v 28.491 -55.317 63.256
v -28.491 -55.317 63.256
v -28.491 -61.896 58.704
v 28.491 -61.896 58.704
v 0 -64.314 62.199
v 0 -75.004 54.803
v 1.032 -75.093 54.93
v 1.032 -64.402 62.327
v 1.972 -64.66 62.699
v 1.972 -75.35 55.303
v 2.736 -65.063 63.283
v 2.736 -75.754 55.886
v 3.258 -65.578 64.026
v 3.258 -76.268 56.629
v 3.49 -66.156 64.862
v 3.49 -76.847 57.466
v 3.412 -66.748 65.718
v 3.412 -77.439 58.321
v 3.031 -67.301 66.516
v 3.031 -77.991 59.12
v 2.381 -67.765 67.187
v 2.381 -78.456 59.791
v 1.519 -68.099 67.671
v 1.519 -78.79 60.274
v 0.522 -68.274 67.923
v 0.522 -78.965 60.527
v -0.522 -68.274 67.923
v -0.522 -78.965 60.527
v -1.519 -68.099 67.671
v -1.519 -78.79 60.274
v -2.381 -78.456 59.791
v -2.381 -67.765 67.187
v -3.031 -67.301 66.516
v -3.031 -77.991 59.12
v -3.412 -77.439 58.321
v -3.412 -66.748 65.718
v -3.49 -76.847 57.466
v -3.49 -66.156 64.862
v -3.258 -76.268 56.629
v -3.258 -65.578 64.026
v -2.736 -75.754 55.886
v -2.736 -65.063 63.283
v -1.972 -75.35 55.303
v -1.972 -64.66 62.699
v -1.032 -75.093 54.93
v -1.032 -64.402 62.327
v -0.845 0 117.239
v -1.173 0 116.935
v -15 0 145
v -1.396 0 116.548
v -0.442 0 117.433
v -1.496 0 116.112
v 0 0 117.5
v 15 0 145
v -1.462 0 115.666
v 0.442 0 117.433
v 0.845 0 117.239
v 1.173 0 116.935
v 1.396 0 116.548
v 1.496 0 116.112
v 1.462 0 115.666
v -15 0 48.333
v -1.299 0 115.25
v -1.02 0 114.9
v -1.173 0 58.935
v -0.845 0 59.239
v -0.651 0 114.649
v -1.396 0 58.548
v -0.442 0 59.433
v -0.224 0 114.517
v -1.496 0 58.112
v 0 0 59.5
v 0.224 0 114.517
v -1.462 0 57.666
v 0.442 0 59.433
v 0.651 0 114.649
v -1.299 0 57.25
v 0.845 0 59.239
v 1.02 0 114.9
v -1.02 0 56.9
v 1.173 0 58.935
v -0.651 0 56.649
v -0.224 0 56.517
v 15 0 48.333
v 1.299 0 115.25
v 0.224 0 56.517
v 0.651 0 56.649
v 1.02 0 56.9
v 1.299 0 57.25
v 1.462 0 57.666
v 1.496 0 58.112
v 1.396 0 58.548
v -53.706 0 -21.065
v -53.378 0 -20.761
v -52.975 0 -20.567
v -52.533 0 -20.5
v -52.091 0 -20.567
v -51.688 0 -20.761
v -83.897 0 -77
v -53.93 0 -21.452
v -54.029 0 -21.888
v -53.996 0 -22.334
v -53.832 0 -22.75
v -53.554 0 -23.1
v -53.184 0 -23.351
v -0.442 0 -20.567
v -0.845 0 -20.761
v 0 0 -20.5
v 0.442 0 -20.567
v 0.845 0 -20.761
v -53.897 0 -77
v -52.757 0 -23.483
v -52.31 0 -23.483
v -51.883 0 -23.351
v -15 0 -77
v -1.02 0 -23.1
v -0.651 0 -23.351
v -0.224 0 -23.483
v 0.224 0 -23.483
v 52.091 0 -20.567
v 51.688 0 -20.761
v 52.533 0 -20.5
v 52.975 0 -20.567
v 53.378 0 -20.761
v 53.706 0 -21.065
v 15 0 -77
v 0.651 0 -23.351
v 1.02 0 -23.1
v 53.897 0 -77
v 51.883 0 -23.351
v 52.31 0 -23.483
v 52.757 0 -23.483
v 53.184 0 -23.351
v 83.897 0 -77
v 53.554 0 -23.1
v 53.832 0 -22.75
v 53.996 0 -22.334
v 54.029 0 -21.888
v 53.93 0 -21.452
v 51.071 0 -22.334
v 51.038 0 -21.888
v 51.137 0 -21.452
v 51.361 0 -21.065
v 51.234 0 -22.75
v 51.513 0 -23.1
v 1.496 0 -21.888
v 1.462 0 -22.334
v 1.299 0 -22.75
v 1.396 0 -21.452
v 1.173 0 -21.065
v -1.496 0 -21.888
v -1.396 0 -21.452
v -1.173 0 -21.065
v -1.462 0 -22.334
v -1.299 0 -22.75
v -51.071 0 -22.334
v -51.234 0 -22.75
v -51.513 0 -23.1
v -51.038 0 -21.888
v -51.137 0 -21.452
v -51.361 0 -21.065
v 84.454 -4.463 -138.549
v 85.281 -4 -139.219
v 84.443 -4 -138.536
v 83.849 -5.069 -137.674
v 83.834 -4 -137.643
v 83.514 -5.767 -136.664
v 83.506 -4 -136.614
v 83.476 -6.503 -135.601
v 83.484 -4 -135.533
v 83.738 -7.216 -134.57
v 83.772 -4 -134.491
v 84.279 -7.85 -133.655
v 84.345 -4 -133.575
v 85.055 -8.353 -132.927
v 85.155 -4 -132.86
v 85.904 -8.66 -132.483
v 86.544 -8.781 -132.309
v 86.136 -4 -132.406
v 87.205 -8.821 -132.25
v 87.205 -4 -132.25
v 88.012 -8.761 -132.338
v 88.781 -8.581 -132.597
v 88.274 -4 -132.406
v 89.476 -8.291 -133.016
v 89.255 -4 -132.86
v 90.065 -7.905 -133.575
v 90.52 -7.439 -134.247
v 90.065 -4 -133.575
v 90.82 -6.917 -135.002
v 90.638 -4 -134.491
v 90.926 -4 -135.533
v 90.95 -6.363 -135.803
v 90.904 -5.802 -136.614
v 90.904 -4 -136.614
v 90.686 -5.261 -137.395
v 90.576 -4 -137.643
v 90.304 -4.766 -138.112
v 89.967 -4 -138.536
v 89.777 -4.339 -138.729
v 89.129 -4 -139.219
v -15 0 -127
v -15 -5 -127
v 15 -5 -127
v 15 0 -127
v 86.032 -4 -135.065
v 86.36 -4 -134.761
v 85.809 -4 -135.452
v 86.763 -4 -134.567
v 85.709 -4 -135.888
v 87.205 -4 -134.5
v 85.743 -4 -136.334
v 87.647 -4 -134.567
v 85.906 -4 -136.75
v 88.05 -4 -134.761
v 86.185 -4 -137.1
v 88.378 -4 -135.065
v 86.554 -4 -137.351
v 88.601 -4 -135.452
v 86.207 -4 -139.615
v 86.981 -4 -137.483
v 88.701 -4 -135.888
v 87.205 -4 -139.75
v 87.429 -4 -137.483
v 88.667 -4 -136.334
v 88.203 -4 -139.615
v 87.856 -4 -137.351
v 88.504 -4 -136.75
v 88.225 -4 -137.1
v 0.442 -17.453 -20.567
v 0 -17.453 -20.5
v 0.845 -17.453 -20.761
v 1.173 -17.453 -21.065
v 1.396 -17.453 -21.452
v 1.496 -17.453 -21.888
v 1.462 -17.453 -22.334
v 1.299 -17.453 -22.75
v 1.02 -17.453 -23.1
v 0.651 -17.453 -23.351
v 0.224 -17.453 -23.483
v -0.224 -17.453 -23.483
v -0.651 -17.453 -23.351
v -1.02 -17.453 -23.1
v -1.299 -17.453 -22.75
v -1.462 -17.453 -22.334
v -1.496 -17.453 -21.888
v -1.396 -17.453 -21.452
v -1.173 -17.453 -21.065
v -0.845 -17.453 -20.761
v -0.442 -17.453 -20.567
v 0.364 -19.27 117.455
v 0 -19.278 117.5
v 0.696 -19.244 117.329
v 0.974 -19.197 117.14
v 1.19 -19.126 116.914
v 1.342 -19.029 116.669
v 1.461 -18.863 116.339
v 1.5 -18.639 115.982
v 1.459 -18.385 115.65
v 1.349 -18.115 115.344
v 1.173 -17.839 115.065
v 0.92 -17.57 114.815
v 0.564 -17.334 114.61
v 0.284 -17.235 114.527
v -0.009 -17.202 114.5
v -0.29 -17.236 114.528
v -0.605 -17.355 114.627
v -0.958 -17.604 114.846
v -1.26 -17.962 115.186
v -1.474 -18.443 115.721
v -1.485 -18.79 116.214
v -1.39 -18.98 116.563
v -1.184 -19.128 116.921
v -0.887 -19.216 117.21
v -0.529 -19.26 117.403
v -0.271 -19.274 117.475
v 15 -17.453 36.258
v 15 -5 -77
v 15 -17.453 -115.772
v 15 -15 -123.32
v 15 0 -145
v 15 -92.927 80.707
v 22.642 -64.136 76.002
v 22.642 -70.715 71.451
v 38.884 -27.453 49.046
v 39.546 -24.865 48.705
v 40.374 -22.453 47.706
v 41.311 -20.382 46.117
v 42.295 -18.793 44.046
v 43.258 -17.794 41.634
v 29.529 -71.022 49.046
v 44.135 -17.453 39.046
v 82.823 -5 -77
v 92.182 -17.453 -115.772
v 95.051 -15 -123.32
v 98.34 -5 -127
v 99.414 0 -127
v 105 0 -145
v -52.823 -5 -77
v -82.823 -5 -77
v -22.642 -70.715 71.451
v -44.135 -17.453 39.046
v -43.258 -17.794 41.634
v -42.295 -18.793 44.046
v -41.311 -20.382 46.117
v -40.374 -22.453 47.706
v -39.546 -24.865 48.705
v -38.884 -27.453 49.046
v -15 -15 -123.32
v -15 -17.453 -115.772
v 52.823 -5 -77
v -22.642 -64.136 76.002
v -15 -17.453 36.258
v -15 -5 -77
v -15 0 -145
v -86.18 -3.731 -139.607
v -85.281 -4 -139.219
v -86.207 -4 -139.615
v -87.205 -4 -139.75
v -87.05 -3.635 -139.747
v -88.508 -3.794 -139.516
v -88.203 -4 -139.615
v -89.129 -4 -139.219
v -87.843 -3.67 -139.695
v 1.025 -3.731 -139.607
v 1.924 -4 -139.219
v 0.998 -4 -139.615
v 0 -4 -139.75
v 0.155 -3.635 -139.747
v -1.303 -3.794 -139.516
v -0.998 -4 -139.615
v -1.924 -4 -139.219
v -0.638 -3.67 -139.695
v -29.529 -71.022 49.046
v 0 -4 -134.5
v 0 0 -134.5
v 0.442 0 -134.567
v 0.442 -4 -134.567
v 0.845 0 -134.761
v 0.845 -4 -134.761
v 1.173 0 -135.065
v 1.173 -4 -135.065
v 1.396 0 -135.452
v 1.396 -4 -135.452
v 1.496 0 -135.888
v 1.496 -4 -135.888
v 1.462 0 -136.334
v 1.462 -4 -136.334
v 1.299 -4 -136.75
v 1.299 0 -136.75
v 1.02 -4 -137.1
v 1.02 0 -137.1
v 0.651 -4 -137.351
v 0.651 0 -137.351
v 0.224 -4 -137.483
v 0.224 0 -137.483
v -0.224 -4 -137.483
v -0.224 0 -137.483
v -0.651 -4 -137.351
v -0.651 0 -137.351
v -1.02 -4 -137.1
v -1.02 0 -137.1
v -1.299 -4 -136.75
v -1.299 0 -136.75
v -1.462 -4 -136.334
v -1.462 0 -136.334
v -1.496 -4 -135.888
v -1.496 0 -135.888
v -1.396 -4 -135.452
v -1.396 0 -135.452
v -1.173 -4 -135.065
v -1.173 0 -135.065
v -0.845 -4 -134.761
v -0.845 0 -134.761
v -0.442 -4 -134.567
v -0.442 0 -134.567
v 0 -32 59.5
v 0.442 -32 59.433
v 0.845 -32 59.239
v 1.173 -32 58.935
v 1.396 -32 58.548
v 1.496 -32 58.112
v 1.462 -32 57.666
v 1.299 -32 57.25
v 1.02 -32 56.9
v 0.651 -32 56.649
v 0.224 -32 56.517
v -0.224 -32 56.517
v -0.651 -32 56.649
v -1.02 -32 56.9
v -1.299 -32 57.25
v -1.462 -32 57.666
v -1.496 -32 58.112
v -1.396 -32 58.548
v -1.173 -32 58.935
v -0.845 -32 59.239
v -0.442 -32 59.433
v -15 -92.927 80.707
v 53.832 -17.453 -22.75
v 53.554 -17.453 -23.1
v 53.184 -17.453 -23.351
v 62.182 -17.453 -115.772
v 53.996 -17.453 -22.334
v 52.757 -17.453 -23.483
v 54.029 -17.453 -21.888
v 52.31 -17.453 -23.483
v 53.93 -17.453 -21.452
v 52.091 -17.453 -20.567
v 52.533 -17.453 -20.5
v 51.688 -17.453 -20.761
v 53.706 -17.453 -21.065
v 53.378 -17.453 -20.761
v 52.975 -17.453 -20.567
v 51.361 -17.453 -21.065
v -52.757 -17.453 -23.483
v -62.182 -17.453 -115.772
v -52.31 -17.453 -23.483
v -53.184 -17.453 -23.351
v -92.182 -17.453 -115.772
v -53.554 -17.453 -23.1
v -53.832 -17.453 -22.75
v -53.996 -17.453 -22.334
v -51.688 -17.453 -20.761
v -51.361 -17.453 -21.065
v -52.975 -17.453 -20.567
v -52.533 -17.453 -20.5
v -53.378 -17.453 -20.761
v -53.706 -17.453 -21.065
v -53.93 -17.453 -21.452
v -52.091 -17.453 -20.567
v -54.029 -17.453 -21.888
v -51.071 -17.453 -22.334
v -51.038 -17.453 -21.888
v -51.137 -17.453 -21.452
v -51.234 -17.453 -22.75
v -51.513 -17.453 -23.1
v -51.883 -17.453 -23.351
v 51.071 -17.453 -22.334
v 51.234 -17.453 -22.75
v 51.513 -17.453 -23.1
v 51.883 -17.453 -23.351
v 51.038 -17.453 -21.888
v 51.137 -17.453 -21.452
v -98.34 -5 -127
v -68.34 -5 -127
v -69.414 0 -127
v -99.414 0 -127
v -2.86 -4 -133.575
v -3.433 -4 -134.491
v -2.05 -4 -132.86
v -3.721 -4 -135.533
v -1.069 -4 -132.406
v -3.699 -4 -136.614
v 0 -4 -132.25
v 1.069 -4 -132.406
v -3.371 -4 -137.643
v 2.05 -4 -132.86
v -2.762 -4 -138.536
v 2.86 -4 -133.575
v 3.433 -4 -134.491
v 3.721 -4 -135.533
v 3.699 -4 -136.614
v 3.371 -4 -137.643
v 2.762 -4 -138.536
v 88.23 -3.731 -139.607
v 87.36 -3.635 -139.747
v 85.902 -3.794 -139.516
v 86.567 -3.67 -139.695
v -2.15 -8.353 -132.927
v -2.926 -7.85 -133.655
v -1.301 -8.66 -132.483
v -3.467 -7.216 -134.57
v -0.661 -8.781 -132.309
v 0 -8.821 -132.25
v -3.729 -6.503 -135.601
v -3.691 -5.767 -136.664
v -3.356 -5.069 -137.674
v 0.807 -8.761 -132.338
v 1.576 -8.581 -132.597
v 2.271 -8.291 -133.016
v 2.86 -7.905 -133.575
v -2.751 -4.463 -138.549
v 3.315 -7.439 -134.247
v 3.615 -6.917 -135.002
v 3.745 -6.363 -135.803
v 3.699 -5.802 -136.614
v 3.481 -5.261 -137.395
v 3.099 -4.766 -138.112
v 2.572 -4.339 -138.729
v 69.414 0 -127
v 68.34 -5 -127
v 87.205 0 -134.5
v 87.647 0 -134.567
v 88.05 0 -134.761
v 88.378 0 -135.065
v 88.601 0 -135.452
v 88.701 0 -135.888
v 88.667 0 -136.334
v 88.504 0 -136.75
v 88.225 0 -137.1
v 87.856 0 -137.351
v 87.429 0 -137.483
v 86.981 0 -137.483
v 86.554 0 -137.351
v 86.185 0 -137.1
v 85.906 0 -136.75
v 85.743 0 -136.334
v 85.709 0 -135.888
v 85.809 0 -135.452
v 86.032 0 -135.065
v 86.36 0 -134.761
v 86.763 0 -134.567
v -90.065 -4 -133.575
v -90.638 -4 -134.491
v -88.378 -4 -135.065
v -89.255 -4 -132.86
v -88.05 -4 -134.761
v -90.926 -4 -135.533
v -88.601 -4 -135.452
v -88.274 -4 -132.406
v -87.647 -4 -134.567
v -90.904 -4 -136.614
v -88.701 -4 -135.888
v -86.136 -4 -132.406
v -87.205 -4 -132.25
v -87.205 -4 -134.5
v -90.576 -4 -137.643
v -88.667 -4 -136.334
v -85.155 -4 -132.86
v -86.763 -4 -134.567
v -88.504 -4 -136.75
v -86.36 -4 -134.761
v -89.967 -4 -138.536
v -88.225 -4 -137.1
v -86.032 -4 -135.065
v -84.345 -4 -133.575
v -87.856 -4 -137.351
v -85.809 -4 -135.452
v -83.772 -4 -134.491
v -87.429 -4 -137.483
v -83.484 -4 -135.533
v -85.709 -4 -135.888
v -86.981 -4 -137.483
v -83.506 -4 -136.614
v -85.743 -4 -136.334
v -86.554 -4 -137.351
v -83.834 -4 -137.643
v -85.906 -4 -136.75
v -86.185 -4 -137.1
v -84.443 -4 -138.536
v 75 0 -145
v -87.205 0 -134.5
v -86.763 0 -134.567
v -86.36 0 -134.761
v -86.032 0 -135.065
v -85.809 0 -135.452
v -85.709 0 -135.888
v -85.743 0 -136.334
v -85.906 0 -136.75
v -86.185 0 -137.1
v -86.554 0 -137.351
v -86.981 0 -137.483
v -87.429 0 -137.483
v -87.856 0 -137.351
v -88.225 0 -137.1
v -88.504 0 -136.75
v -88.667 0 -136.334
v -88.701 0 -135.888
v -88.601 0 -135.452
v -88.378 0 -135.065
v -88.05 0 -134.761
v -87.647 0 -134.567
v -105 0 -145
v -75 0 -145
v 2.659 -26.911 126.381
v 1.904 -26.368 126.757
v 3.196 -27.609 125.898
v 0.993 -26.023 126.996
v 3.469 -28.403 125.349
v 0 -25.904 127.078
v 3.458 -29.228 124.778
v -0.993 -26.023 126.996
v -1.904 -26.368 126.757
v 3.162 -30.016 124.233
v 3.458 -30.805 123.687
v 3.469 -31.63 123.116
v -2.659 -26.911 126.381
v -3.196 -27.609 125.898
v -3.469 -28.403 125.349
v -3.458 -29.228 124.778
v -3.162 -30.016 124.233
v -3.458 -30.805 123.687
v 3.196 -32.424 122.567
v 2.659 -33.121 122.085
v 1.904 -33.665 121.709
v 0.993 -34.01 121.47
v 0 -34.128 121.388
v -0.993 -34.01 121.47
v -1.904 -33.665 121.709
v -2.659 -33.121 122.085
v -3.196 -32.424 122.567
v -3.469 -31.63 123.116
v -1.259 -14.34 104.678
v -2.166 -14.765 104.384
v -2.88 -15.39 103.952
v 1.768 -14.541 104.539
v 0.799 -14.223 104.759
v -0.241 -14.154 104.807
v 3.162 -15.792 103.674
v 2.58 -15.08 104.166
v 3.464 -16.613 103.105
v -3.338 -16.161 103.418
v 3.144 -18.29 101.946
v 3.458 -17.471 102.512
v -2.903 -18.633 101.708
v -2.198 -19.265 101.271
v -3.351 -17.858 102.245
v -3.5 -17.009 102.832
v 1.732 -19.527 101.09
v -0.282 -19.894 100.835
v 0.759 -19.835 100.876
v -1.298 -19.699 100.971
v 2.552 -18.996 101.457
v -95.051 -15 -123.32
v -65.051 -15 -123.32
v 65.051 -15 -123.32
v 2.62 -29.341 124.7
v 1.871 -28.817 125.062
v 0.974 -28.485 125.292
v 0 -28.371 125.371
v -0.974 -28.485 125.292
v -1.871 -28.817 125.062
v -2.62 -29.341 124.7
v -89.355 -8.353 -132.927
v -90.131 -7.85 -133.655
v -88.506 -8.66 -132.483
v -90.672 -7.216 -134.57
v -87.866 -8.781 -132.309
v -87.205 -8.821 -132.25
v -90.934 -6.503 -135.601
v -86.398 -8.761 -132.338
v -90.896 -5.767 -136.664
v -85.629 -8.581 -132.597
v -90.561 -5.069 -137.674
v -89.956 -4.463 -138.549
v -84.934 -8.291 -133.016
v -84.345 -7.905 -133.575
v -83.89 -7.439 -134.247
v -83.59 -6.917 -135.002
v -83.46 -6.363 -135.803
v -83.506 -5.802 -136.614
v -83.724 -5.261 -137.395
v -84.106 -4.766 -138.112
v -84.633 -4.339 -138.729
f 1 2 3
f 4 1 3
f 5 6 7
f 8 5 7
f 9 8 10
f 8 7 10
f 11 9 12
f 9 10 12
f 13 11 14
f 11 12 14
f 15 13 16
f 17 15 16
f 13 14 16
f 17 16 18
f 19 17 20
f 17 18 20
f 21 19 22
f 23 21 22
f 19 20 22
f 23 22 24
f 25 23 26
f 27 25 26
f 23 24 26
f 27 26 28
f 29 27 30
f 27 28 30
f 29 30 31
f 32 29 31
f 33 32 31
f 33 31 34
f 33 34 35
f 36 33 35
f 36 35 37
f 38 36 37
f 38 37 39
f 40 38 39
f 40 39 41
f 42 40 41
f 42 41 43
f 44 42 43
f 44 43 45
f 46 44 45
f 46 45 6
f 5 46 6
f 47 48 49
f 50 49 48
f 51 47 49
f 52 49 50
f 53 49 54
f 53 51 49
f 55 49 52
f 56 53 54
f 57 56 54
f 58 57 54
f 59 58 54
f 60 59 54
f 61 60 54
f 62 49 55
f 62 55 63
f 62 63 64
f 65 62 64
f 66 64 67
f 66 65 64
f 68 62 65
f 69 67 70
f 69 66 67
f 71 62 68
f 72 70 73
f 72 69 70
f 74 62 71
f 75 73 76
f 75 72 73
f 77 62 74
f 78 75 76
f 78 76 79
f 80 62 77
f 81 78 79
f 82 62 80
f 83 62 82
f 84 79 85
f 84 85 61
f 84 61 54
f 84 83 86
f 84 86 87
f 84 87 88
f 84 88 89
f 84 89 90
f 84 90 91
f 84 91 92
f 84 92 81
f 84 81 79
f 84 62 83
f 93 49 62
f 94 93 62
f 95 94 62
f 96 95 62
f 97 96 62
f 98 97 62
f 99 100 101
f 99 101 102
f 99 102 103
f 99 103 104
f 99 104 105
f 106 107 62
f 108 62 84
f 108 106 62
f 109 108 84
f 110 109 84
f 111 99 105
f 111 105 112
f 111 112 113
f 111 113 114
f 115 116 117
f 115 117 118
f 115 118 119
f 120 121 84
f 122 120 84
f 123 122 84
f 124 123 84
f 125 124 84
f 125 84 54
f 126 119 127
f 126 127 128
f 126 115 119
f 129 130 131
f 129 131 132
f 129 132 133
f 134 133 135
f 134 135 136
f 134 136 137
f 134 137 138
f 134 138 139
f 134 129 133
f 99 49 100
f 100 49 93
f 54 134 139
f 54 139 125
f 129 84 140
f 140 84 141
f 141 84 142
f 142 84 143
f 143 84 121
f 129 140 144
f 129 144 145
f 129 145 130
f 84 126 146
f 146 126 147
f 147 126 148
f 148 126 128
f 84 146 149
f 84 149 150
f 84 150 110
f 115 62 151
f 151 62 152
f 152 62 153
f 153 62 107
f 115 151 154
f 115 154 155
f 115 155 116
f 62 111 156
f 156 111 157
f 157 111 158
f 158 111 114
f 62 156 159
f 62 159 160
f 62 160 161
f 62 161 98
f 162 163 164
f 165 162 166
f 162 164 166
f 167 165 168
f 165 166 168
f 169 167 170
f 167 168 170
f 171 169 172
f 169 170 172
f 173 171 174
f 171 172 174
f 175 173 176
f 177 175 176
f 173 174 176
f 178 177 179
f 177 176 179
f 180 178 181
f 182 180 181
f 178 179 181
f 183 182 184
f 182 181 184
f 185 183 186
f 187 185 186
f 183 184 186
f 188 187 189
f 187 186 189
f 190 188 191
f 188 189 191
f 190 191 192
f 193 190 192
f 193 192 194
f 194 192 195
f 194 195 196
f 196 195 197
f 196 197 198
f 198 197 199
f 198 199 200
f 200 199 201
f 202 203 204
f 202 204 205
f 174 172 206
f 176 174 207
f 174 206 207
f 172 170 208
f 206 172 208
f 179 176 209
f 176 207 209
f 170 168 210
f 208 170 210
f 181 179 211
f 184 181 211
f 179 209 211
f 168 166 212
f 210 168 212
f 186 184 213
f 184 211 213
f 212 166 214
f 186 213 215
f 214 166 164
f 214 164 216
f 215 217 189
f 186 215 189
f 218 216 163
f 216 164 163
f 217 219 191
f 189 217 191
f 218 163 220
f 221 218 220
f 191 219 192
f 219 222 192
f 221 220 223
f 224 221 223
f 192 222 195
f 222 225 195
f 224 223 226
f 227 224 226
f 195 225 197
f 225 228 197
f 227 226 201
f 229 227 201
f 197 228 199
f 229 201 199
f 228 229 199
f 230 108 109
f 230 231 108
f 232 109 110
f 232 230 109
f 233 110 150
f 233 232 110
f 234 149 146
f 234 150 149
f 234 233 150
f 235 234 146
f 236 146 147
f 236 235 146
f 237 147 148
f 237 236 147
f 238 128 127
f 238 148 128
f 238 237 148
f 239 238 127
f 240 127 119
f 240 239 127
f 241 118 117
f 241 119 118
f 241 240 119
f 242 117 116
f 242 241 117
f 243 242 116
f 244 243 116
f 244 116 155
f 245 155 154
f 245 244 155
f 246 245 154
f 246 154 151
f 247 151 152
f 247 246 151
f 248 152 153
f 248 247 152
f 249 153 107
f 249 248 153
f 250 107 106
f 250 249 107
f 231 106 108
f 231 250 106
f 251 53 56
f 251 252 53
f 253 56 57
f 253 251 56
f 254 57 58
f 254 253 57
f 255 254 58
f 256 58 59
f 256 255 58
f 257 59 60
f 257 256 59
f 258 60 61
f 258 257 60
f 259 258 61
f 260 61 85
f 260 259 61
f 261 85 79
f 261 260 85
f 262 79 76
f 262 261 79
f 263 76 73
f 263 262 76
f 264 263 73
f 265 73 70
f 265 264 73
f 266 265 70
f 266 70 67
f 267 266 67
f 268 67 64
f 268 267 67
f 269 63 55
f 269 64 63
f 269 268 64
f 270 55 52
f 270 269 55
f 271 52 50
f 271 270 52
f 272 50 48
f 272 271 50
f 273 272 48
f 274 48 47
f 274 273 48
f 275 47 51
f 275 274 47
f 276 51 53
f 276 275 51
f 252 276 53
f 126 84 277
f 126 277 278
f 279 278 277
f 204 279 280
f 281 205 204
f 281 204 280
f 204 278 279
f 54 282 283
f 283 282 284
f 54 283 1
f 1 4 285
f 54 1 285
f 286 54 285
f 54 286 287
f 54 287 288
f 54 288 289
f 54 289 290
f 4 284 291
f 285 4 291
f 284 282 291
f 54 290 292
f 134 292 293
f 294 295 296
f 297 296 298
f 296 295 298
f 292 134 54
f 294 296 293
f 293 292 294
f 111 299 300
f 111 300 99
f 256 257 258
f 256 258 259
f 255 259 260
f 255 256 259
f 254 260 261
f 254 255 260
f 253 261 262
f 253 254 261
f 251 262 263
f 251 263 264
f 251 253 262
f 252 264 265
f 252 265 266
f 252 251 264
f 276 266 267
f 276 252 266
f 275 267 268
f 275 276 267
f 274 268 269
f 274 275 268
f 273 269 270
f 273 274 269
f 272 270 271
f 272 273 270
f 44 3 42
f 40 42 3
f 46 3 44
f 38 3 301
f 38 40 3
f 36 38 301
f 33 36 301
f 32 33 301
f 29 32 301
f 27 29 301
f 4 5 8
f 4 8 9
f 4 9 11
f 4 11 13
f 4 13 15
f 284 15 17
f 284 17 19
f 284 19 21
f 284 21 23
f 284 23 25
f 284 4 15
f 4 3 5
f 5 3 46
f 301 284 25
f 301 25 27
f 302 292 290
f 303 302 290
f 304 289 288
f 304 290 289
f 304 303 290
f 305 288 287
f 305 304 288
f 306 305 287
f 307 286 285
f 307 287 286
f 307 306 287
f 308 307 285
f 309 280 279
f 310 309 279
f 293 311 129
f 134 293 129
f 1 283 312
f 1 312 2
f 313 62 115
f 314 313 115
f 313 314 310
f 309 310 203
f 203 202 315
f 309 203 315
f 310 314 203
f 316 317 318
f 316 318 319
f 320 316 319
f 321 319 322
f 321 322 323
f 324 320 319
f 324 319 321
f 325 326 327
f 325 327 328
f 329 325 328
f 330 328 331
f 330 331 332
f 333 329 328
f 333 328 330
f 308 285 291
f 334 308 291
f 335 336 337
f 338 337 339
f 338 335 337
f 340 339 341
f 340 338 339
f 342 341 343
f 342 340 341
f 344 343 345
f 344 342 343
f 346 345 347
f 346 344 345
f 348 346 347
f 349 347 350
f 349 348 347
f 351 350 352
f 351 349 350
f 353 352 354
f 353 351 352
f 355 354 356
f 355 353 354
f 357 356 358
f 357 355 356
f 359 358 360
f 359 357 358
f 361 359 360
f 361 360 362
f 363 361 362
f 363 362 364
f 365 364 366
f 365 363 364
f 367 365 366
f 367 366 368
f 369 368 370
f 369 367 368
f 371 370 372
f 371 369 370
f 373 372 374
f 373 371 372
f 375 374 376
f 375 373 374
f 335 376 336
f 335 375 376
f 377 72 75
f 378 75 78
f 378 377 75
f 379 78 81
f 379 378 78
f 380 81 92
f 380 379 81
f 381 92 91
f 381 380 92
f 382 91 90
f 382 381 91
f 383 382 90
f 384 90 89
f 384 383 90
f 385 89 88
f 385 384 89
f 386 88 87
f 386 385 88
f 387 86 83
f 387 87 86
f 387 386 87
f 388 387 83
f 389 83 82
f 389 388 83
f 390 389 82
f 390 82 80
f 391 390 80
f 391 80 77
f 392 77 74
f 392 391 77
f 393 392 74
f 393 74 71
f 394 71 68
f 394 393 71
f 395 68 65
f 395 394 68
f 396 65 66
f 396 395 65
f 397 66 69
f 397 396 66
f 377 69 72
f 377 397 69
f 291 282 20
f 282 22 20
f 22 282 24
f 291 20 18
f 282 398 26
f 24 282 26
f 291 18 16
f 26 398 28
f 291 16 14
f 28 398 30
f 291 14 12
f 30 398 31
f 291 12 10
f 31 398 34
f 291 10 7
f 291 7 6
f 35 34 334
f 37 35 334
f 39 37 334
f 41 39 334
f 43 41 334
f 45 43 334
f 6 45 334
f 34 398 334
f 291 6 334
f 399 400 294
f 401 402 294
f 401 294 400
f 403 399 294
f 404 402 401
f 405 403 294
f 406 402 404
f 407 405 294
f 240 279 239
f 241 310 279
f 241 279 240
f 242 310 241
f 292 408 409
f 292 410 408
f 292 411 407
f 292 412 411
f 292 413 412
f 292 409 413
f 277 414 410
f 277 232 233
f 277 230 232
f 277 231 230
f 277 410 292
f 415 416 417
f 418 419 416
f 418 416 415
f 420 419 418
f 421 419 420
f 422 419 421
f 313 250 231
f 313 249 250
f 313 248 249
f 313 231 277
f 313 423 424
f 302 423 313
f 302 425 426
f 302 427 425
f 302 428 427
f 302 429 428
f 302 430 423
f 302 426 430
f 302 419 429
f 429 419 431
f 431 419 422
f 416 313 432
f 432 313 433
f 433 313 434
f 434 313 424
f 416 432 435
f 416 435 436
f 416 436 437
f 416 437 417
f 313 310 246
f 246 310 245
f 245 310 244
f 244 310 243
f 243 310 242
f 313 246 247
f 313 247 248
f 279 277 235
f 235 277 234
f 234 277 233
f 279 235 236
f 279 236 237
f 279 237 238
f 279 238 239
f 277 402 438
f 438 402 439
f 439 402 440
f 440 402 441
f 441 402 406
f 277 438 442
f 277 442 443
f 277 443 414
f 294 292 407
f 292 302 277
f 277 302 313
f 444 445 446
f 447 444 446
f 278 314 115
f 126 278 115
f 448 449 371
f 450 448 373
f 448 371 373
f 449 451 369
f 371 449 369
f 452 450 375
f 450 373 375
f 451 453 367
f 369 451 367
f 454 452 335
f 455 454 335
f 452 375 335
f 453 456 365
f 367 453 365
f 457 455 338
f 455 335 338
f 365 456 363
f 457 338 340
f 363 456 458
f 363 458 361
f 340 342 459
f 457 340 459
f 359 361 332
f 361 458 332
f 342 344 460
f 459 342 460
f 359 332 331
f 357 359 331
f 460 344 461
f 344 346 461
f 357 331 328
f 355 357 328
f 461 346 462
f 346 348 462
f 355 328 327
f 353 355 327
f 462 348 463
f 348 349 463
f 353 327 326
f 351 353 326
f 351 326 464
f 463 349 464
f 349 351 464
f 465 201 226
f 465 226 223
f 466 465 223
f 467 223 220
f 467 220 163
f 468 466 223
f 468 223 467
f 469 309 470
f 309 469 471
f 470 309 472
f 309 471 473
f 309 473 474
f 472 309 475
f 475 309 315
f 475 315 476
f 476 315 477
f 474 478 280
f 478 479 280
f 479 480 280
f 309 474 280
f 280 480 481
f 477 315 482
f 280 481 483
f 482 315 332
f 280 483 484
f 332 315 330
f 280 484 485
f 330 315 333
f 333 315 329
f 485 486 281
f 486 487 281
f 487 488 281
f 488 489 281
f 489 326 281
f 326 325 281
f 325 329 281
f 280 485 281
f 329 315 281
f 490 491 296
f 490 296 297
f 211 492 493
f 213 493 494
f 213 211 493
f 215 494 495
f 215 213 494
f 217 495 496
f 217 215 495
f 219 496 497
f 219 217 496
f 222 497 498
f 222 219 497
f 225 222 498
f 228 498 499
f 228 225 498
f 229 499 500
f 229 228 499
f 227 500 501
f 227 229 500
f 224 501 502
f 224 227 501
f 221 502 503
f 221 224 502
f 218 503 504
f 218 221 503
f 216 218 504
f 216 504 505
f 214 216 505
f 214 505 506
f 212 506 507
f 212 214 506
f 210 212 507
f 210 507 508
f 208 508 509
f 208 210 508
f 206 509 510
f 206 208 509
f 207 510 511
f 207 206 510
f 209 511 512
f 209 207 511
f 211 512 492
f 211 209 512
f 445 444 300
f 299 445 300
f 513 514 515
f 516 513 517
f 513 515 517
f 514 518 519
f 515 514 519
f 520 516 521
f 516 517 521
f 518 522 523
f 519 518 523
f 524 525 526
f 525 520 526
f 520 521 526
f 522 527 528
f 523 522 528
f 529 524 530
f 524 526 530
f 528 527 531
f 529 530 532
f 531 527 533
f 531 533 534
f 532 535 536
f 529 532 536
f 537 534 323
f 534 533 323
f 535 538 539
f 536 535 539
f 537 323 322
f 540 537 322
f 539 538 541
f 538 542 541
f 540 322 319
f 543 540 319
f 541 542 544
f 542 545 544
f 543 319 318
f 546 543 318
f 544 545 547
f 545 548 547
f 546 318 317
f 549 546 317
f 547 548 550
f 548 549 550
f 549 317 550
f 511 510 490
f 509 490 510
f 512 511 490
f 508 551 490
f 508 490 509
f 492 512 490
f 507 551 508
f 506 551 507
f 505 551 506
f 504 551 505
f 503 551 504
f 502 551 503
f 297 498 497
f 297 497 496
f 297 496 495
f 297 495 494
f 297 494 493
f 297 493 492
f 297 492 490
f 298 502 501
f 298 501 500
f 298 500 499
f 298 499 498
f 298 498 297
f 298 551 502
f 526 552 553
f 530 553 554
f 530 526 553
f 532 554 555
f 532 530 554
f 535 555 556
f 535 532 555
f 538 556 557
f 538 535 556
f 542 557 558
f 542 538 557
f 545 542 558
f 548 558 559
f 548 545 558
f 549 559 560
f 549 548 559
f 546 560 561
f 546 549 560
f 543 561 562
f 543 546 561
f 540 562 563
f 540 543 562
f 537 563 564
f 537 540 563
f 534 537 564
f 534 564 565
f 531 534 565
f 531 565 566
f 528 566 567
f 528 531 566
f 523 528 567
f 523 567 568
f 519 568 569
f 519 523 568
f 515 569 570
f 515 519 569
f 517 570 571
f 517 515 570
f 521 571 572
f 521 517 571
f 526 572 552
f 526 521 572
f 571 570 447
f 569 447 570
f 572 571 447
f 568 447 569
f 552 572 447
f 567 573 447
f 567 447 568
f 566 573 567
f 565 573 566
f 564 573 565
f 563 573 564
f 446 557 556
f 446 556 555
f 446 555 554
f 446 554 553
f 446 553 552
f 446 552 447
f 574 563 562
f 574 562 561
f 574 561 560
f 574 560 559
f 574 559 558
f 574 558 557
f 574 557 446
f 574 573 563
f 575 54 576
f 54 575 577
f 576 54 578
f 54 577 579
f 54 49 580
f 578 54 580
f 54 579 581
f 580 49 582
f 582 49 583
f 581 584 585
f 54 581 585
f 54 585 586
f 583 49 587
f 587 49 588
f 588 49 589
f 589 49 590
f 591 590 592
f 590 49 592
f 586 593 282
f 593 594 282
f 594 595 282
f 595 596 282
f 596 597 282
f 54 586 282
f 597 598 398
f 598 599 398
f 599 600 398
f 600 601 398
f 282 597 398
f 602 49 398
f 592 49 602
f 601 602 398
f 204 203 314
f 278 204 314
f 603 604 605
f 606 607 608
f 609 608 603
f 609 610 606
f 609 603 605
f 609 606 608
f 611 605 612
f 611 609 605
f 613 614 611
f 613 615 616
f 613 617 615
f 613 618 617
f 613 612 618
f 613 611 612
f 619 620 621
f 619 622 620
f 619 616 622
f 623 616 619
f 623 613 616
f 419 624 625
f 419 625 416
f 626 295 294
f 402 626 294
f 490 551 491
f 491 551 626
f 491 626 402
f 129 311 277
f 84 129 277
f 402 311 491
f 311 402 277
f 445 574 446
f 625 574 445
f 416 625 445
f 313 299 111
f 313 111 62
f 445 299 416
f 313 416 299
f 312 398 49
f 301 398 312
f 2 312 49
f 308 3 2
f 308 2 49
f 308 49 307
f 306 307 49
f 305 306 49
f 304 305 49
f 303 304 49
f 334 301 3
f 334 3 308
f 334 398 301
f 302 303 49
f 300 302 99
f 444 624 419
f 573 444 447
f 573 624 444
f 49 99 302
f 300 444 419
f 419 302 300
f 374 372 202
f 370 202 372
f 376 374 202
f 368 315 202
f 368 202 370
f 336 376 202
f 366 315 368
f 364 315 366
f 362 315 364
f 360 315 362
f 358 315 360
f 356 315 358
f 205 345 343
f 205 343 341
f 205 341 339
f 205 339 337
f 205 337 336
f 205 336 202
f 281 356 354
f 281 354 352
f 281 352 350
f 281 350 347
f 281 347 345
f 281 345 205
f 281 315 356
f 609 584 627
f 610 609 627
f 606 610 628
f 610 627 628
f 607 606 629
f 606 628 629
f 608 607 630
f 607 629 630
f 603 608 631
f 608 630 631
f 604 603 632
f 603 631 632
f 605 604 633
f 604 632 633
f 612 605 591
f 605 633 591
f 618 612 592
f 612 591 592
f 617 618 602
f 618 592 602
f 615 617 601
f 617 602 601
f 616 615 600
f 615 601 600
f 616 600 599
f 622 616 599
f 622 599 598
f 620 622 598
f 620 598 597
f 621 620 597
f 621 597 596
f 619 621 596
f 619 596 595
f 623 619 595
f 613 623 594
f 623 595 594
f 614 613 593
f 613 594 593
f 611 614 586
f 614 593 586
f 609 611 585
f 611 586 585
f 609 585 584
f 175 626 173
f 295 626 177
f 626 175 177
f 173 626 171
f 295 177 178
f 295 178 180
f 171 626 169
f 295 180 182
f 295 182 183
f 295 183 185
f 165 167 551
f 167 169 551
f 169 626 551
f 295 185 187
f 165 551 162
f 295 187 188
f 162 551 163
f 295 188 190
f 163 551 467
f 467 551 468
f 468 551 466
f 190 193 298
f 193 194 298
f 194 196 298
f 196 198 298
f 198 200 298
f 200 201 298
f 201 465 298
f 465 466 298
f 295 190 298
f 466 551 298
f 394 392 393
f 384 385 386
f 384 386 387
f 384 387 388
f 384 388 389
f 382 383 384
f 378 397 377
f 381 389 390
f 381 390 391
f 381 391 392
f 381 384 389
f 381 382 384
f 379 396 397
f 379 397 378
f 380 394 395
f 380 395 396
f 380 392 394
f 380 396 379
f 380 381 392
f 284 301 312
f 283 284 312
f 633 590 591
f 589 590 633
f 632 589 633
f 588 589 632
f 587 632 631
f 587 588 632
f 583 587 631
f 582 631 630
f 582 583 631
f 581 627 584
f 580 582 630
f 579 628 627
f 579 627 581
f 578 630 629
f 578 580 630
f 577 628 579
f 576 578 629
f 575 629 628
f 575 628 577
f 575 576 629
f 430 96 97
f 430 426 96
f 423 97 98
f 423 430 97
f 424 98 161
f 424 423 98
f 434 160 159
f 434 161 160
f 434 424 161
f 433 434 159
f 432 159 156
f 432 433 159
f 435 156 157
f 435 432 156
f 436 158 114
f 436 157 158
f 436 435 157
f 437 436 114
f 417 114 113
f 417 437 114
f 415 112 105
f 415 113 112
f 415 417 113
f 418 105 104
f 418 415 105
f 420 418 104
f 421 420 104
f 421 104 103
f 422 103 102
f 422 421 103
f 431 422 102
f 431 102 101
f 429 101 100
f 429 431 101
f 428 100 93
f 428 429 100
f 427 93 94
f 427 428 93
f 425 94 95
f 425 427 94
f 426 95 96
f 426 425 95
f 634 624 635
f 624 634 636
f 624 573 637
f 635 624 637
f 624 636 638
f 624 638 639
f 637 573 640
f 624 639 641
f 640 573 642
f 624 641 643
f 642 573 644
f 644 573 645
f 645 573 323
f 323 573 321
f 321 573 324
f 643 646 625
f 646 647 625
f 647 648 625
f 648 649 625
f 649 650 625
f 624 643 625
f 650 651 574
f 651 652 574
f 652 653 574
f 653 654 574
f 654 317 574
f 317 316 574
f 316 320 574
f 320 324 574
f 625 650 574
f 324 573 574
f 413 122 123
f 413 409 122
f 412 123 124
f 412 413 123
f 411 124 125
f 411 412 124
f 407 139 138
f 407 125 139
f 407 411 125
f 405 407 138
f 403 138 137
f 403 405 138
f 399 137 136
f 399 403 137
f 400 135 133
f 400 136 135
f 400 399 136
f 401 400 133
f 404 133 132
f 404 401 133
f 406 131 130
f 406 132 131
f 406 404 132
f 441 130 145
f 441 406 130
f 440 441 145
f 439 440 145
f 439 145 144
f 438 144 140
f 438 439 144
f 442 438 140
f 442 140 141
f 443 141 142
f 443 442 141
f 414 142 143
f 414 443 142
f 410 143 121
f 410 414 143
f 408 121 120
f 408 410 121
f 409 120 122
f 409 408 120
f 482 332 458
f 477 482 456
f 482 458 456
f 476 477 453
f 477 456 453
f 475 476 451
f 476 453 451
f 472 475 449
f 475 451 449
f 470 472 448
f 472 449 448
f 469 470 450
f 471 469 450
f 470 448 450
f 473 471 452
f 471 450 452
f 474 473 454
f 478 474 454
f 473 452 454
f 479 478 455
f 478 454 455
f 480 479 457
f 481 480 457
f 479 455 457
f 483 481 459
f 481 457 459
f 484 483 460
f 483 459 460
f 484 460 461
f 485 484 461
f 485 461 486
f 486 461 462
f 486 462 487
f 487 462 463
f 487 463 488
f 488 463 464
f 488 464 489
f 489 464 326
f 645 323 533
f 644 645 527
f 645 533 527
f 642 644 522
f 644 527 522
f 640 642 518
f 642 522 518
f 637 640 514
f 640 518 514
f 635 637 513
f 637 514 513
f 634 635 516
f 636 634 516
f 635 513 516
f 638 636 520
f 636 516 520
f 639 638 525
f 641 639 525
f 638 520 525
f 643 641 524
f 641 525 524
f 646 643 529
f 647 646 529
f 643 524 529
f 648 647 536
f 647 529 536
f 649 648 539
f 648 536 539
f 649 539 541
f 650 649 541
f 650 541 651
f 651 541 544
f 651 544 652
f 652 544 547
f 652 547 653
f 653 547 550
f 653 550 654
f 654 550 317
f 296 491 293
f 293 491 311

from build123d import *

# Parameters (mm, degrees)
CROQUIS2_W                  = 390
CROQUIS2_H                  = 290
SALIENTE_EXTRUIR2_DEPTH     = 10
CROQUIS3_W                  = 390
CROQUIS3_H                  = 7
SALIENTE_EXTRUIR3_DEPTH     = 25
SALIENTE_EXTRUIR4_DEPTH     = 390
CORTAR_EXTRUIR1_DEPTH       = 180
CORTAR_EXTRUIR2_DEPTH       = 180
SALIENTE_EXTRUIR5_DEPTH     = 179
CROQUIS10_W                 = 283
CROQUIS10_H                 = 194.109962813
CORTAR_EXTRUIR5_DEPTH       = 236
CORTAR_EXTRUIR6_DEPTH       = 236
SALIENTE_EXTRUIR6_DEPTH     = 236
CROQUIS13_W                 = 339.798946509
CROQUIS13_H                 = 236.819651801
CROQUIS13_W_2               = 44.776464784
CROQUIS13_H_2               = 75.104657821
CORTAR_EXTRUIR7_DEPTH       = 500
CROQUIS14_W                 = 59.446000687
CROQUIS14_H                 = 81.435889979
CORTAR_EXTRUIR8_DEPTH       = 500
CROQUIS15_W                 = 50
CROQUIS15_H                 = 5
CORTAR_EXTRUIR9_DEPTH       = 500
CROQUIS16_W                 = 390
CROQUIS16_H                 = 283
CORTAR_EXTRUIR10_DEPTH      = 10
CROQUIS17_R                 = 3.75
CORTAR_EXTRUIR11_DEPTH      = 10
CROQUIS18_R                 = 3.75
CROQUIS18_R_2               = 1.5
SALIENTE_EXTRUIR8_DEPTH     = 4
CROQUIS19_R                 = 1.5
SALIENTE_EXTRUIR10_DEPTH    = 15
CROQUIS20_R                 = 1.5
SALIENTE_EXTRUIR11_DEPTH    = 15
SALIENTE_EXTRUIR11_2_DEPTH  = 15
SALIENTE_EXTRUIR11_3_DEPTH  = 15
CROQUIS21_W                 = 390
CROQUIS21_H                 = 283
SALIENTE_EXTRUIR12_DEPTH    = 10
CORTAR_EXTRUIR12_START      = -47
CROQUIS22_R                 = 1.5
CORTAR_EXTRUIR12_DEPTH      = 47
CROQUIS26_W                 = 283
CROQUIS26_H                 = 4.5
CORTAR_EXTRUIR16_DEPTH      = 500
CROQUIS27_W                 = 7
CROQUIS27_H                 = 9.5
CORTAR_EXTRUIR17_DEPTH      = 500
CORTAR_EXTRUIR18_DEPTH      = 500
CROQUIS29_R                 = 3.5
CORTAR_EXTRUIR19_DEPTH      = 20
CORTAR_EXTRUIR20_DEPTH      = 314
CROQUIS32_R                 = 3.5
CORTAR_EXTRUIR21_DEPTH      = 25
CROQUIS33_W                 = 308.833685193
CROQUIS33_H                 = 37.038834889
CORTAR_EXTRUIR22_DEPTH      = 500
CROQUIS34_W                 = 390
CROQUIS34_H                 = 290
CROQUIS34_R                 = 1.5
SALIENTE_EXTRUIR14_DEPTH    = 5.5
CROQUIS35_W                 = 390
CROQUIS35_H                 = 10
SALIENTE_EXTRUIR15_DEPTH    = 22
CORTAR_EXTRUIR23_DEPTH      = 488
CORTAR_EXTRUIR28_DEPTH      = 479.5
CROQUIS38_R                 = 3.5
CORTAR_EXTRUIR29_DEPTH      = 25
CROQUIS39_R                 = 1.5
SALIENTE_EXTRUIR16_DEPTH    = 9
CROQUIS40_R                 = 3.5
SALIENTE_EXTRUIR17_DEPTH    = 25
CROQUIS41_R                 = 3.5
CORTAR_EXTRUIR30_DEPTH      = 25
CORTAR_EXTRUIR31_DEPTH      = 41
CORTAR_EXTRUIR31_DEPTH_BACK = 5.5
CROQUIS42_W                 = 390
CROQUIS42_H                 = 290


with BuildPart() as part:
    # Croquis2 → Saliente-Extruir2 (new body)
    with BuildSketch(Plane(origin=(0, 0, 0), x_dir=(1, 0, 0), z_dir=(0, 1, 0))):
        Rectangle(CROQUIS2_W, CROQUIS2_H)
    extrude(amount=SALIENTE_EXTRUIR2_DEPTH)

    # Croquis3 → Saliente-Extruir3 (add)
    with BuildSketch(Plane(origin=(0, 10, 0), x_dir=(1, 0, 0), z_dir=(0, 1, 0))):
        with Locations((0, -141.5)):
            Rectangle(CROQUIS3_W, CROQUIS3_H)
    extrude(amount=SALIENTE_EXTRUIR3_DEPTH)

    # Croquis5 → Saliente-Extruir4 (add)
    with BuildSketch(Plane.ZY.offset(195)):
        Polygon((145, 0), (51.120689647, -135.689627782), (-145, 0), align=None)
    extrude(amount=-SALIENTE_EXTRUIR4_DEPTH)

    # Croquis6 → Cortar-Extruir1 (cut)
    with BuildSketch(Plane.ZY.offset(195)):
        Polygon((-145, 0), (145, 0), (51.120689647, -135.689627782), align=None)
    extrude(amount=-CORTAR_EXTRUIR1_DEPTH, mode=Mode.SUBTRACT)

    # Croquis7 → Cortar-Extruir2 (cut)
    with BuildSketch(Plane(origin=(195, 0, 0), x_dir=(0, 0, -1), z_dir=(1, 0, 0))):
        Polygon((145, 0), (-145, 0), (-51.120689647, -135.689627782), align=None)
    extrude(amount=-CORTAR_EXTRUIR2_DEPTH, mode=Mode.SUBTRACT)

    # Croquis8 → Saliente-Extruir5 (add)
    with BuildSketch(Plane(origin=(0, -67.844813894, -46.939655172), x_dir=(-1, 0, 0), z_dir=(0, -0.8223613805318496, -0.5689655172413796))):
        Polygon((15, -119.242400168), (105, 119.242400177), (75, 119.242400177), (15, -39.747466719), align=None)
    extrude(amount=-SALIENTE_EXTRUIR5_DEPTH)

    # Croquis10 → Cortar-Extruir5 (cut)
    with BuildSketch(Plane.ZY.offset(195)):
        with Locations((-3.5, 107.054981407)):
            Rectangle(CROQUIS10_W, CROQUIS10_H)
    extrude(amount=-CORTAR_EXTRUIR5_DEPTH, mode=Mode.SUBTRACT)

    # Croquis11 → Cortar-Extruir6 (cut)
    with BuildSketch(Plane.ZY.offset(195)):
        Polygon((145, 17.024145748), (144.999999988, 0), (165.789590248, 1.603195777), (161.358166331, 19.30887792), align=None)
    extrude(amount=-CORTAR_EXTRUIR6_DEPTH, mode=Mode.SUBTRACT)

    # Croquis12 → Saliente-Extruir6 (add)
    with BuildSketch(Plane(origin=(0, -67.844813894, -46.939655172), x_dir=(-1, 0, 0), z_dir=(0, -0.8223613805318496, -0.5689655172413796))):
        Polygon((-15, -119.242400168), (-105, 119.242400177), (-75, 119.242400177), (-15, -39.747466719), align=None)
    extrude(amount=-SALIENTE_EXTRUIR6_DEPTH)

    # Croquis13 → Cortar-Extruir7 (cut)
    with BuildSketch(Plane(origin=(195, 0, 0), x_dir=(0, 0, -1), z_dir=(1, 0, 0))):
        with Locations((31.899473255, 128.409825901)):
            Rectangle(CROQUIS13_W, CROQUIS13_H)
        with Locations((-167.388232392, 37.552328911)):
            Rectangle(CROQUIS13_W_2, CROQUIS13_H_2)
    extrude(amount=-CORTAR_EXTRUIR7_DEPTH, mode=Mode.SUBTRACT)

    # Croquis14 → Cortar-Extruir8 (cut)
    with BuildSketch(Plane(origin=(195, 0, 0), x_dir=(0, 0, -1), z_dir=(1, 0, 0))):
        with Locations((-167.723000344, 75.71794499)):
            Rectangle(CROQUIS14_W, CROQUIS14_H)
    extrude(amount=-CORTAR_EXTRUIR8_DEPTH, mode=Mode.SUBTRACT)

    # Croquis15 → Cortar-Extruir9 (cut)
    with BuildSketch(Plane.ZY.offset(195)):
        with Locations((-102, -2.5)):
            Rectangle(CROQUIS15_W, CROQUIS15_H)
    extrude(amount=-CORTAR_EXTRUIR9_DEPTH, mode=Mode.SUBTRACT)

    # Croquis16 → Cortar-Extruir10 (cut)
    with BuildSketch(Plane(origin=(0, 10, 0), x_dir=(1, 0, 0), z_dir=(0, 1, 0))):
        with Locations((0, 3.5)):
            Rectangle(CROQUIS16_W, CROQUIS16_H)
    extrude(amount=-CORTAR_EXTRUIR10_DEPTH, mode=Mode.SUBTRACT)

    # Croquis17 → Cortar-Extruir11 (cut)
    with BuildSketch(Plane(origin=(0, 0, 0), x_dir=(1, 0, 0), z_dir=(0, 1, 0))):
        with Locations(Location((-87.205, 136, 0), (0, 0, 270))):
            Circle(CROQUIS17_R)
        with Locations(Location((0, 136, 0), (0, 0, 270))):
            Circle(CROQUIS17_R)
        with Locations(Location((87.205, 136, 0), (0, 0, 270))):
            Circle(CROQUIS17_R)
    extrude(amount=-CORTAR_EXTRUIR11_DEPTH, mode=Mode.SUBTRACT)

    # Croquis18 → Saliente-Extruir8 (add)
    # profile 1 of 3: a face of its own
    with BuildSketch(Plane(origin=(0, 0, 0), x_dir=(1, 0, 0), z_dir=(0, 1, 0))):
        with Locations((-87.205, 136)):
            Circle(CROQUIS18_R)
        with Locations(Location((-87.205, 136, 0), (0, 0, 270))):
            Circle(CROQUIS18_R_2, mode=Mode.SUBTRACT)
    # profile 2 of 3: a face of its own
    with BuildSketch(Plane(origin=(0, 0, 0), x_dir=(1, 0, 0), z_dir=(0, 1, 0))):
        with Locations((0, 136)):
            Circle(CROQUIS18_R)
        with Locations(Location((0, 136, 0), (0, 0, 270))):
            Circle(CROQUIS18_R_2, mode=Mode.SUBTRACT)
    # profile 3 of 3: a face of its own
    with BuildSketch(Plane(origin=(0, 0, 0), x_dir=(1, 0, 0), z_dir=(0, 1, 0))):
        with Locations((87.205, 136)):
            Circle(CROQUIS18_R)
        with Locations(Location((87.205, 136, 0), (0, 0, 270))):
            Circle(CROQUIS18_R_2, mode=Mode.SUBTRACT)
    extrude(amount=-SALIENTE_EXTRUIR8_DEPTH)

    # Croquis19 → Saliente-Extruir10 (add)
    with BuildSketch(Plane(origin=(0, 0, 0), x_dir=(1, 0, 0), z_dir=(0, 1, 0))):
        with Locations(Location((-52.533337706, 22, 0), (0, 0, 270))):
            Circle(CROQUIS19_R)
        with Locations(Location((0, 22, 0), (0, 0, 270))):
            Circle(CROQUIS19_R)
        with Locations(Location((52.533337706, 22, 0), (0, 0, 270))):
            Circle(CROQUIS19_R)
        with Locations(Location((0, -58, 0), (0, 0, 270))):
            Circle(CROQUIS19_R)
        with Locations(Location((0, -116, 0), (0, 0, 270))):
            Circle(CROQUIS19_R)
    extrude(amount=SALIENTE_EXTRUIR10_DEPTH)



with BuildPart() as body_2:
    # Croquis20 → Saliente-Extruir11 (new body)
    with BuildSketch(Plane(origin=(0, 0, 0), x_dir=(1, 0, 0), z_dir=(0, 1, 0))):
        with Locations(Location((-87.205, 136, 0), (0, 0, 270))):
            Circle(CROQUIS20_R)
    extrude(amount=SALIENTE_EXTRUIR11_DEPTH)


with BuildPart() as body_3:
    # Croquis20 → Saliente-Extruir11 2 (new body)
    with BuildSketch(Plane(origin=(0, 0, 0), x_dir=(1, 0, 0), z_dir=(0, 1, 0))):
        with Locations(Location((0, 136, 0), (0, 0, 270))):
            Circle(CROQUIS20_R)
    extrude(amount=SALIENTE_EXTRUIR11_2_DEPTH)


with BuildPart() as body_4:
    # Croquis20 → Saliente-Extruir11 3 (new body)
    with BuildSketch(Plane(origin=(0, 0, 0), x_dir=(1, 0, 0), z_dir=(0, 1, 0))):
        with Locations(Location((87.205, 136, 0), (0, 0, 270))):
            Circle(CROQUIS20_R)
    extrude(amount=SALIENTE_EXTRUIR11_3_DEPTH)


with BuildPart() as part_1:
    add(part.part)

    add(body_2.part)  # Saliente-Extruir12 merges body 2

    add(body_3.part)  # Saliente-Extruir12 merges body 3

    add(body_4.part)  # Saliente-Extruir12 merges body 4
    # Croquis21 → Saliente-Extruir12 (add)
    with BuildSketch(Plane(origin=(0, 0, 0), x_dir=(1, 0, 0), z_dir=(0, 1, 0))):
        with Locations((0, 3.5)):
            Rectangle(CROQUIS21_W, CROQUIS21_H)
    extrude(amount=SALIENTE_EXTRUIR12_DEPTH)

    # Croquis22 → Cortar-Extruir12 (cut)
    with BuildSketch(Plane(origin=(0, 15, 0), x_dir=(1, 0, 0), z_dir=(0, 1, 0)).offset(CORTAR_EXTRUIR12_START)):
        with Locations(Location((0, -116, 0), (0, 0, 270))):
            Circle(CROQUIS22_R)
        with Locations(Location((0, -58, 0), (0, 0, 270))):
            Circle(CROQUIS22_R)
        with Locations(Location((-52.533337706, 22, 0), (0, 0, 270))):
            Circle(CROQUIS22_R)
        with Locations(Location((0, 22, 0), (0, 0, 270))):
            Circle(CROQUIS22_R)
        with Locations(Location((52.533337706, 22, 0), (0, 0, 270))):
            Circle(CROQUIS22_R)
        with Locations(Location((87.205, 136, 0), (0, 0, 270))):
            Circle(CROQUIS22_R)
        with Locations(Location((0, 136, 0), (0, 0, 270))):
            Circle(CROQUIS22_R)
        with Locations(Location((-87.205, 136, 0), (0, 0, 270))):
            Circle(CROQUIS22_R)
    extrude(amount=CORTAR_EXTRUIR12_DEPTH, mode=Mode.SUBTRACT)

    # Croquis26 → Cortar-Extruir16 (cut)
    with BuildSketch(Plane.ZY.offset(195)):
        with Locations((-3.5, 7.75)):
            Rectangle(CROQUIS26_W, CROQUIS26_H)
    extrude(amount=-CORTAR_EXTRUIR16_DEPTH, mode=Mode.SUBTRACT)

    # Croquis27 → Cortar-Extruir17 (cut)
    with BuildSketch(Plane.ZY.offset(195)):
        with Locations((141.5, 30.25)):
            Rectangle(CROQUIS27_W, CROQUIS27_H)
    extrude(amount=-CORTAR_EXTRUIR17_DEPTH, mode=Mode.SUBTRACT)

    # Croquis28 → Cortar-Extruir18 (cut)
    with BuildSketch(Plane.ZY.offset(195)):
        Polygon((51.120689647, -135.689627782), (80.706896544, -92.926835995), (49.045983393, -71.021663581), (19.459776497, -113.784455368), align=None)
    extrude(amount=-CORTAR_EXTRUIR18_DEPTH, mode=Mode.SUBTRACT)

    # Croquis29 → Cortar-Extruir19 (cut)
    with BuildSketch(Plane(origin=(0, -25.082022106, -17.353448276), x_dir=(-1, 0, 0), z_dir=(0, -0.8223613805318496, -0.5689655172413796))):
        with Locations(Location((0, -91.242400168, 0), (0, 0, 90))):
            Circle(CROQUIS29_R)
    extrude(amount=-CORTAR_EXTRUIR19_DEPTH, mode=Mode.SUBTRACT)

    # Croquis31 → Cortar-Extruir20 (cut)
    with BuildSketch(Plane(origin=(195, 0, 0), x_dir=(0, 0, -1), z_dir=(1, 0, 0))):
        Polygon((-71.450630314, -70.714586325), (-76.002354452, -64.13569528), (-63.255753053, -55.316729763), (-58.704028915, -61.895620807), align=None)
    extrude(amount=-CORTAR_EXTRUIR20_DEPTH, mode=Mode.SUBTRACT)

    # Croquis32 → Cortar-Extruir21 (cut)
    with BuildSketch(Plane(origin=(0, -67.844813897, 98.06034482), x_dir=(1, 0, 0), z_dir=(0, -0.568965517289267, 0.8223613804987178))):
        with Locations(Location((0, 47.5, 0), (0, 0, 270))):
            Circle(CROQUIS32_R)
    extrude(amount=-CORTAR_EXTRUIR21_DEPTH, mode=Mode.SUBTRACT)

    # Croquis33 → Cortar-Extruir22 (cut)
    with BuildSketch(Plane(origin=(195, 0, 0), x_dir=(0, 0, -1), z_dir=(1, 0, 0))):
        with Locations((9.416842597, 18.519417445)):
            Rectangle(CROQUIS33_W, CROQUIS33_H)
    extrude(amount=-CORTAR_EXTRUIR22_DEPTH, mode=Mode.SUBTRACT)

    # Croquis34 → Saliente-Extruir14 (add)
    with BuildSketch(Plane(origin=(0, 0, 0), x_dir=(1, 0, 0), z_dir=(0, 1, 0))):
        Rectangle(CROQUIS34_W, CROQUIS34_H)
        with Locations(Location((0, -58, 0), (0, 0, 270))):
            Circle(CROQUIS34_R, mode=Mode.SUBTRACT)
        with Locations(Location((0, -116, 0), (0, 0, 270))):
            Circle(CROQUIS34_R, mode=Mode.SUBTRACT)
        with Locations(Location((-52.533337706, 22, 0), (0, 0, 270))):
            Circle(CROQUIS34_R, mode=Mode.SUBTRACT)
        with Locations(Location((0, 22, 0), (0, 0, 270))):
            Circle(CROQUIS34_R, mode=Mode.SUBTRACT)
        with Locations(Location((52.533337706, 22, 0), (0, 0, 270))):
            Circle(CROQUIS34_R, mode=Mode.SUBTRACT)
        with Locations(Location((-87.205, 136, 0), (0, 0, 270))):
            Circle(CROQUIS34_R, mode=Mode.SUBTRACT)
        with Locations(Location((0, 136, 0), (0, 0, 270))):
            Circle(CROQUIS34_R, mode=Mode.SUBTRACT)
        with Locations(Location((87.205, 136, 0), (0, 0, 270))):
            Circle(CROQUIS34_R, mode=Mode.SUBTRACT)
    extrude(amount=SALIENTE_EXTRUIR14_DEPTH)

    # Croquis35 → Saliente-Extruir15 (add)
    with BuildSketch(Plane(origin=(0, 5.5, 0), x_dir=(1, 0, 0), z_dir=(0, 1, 0))):
        with Locations((0, -140)):
            Rectangle(CROQUIS35_W, CROQUIS35_H)
    extrude(amount=SALIENTE_EXTRUIR15_DEPTH)

    # Croquis36 → Cortar-Extruir23 (cut)
    with BuildSketch(Plane.ZY.offset(195)):
        Polygon((19.459776497, -113.784455368), (-123.319563604, -15), (49.045983393, -71.021663581), align=None)
    extrude(amount=-CORTAR_EXTRUIR23_DEPTH, mode=Mode.SUBTRACT)

    # Croquis37 → Cortar-Extruir28 (cut)
    with BuildSketch(Plane.ZY.offset(195)):
        with BuildLine():
            Line((-115.772134461, -17.453039739), (39.045983393, -17.453039739))
            ThreePointArc((39.045983393, -17.453039739), (46.117051205, -20.381971927), (49.045983393, -27.453039739))
            Line((49.045983393, -27.453039739), (49.045983393, -71.021663581))
            Line((49.045983393, -71.021663581), (-115.772134461, -17.453039739))
        make_face()
    extrude(amount=-CORTAR_EXTRUIR28_DEPTH, mode=Mode.SUBTRACT)

    # Croquis38 → Cortar-Extruir29 (cut)
    with BuildSketch(Plane(origin=(0, -67.844813897, 98.06034482), x_dir=(1, 0, 0), z_dir=(0, -0.568965517289267, 0.8223613804987178))):
        with Locations((0, 44.5)):
            Circle(CROQUIS38_R)
    extrude(amount=-CORTAR_EXTRUIR29_DEPTH, mode=Mode.SUBTRACT)

    # Croquis39 → Saliente-Extruir16 (add)
    with BuildSketch(Plane(origin=(0, -32, 0), x_dir=(1, 0, 0), z_dir=(0, 1, 0))):
        with Locations(Location((0, -116, 0), (0, 0, 270))):
            Circle(CROQUIS39_R)
    extrude(amount=SALIENTE_EXTRUIR16_DEPTH)

    # Croquis40 → Saliente-Extruir17 (add)
    with BuildSketch(Plane(origin=(0, -67.844813897, 98.06034482), x_dir=(1, 0, 0), z_dir=(0, -0.568965517289267, 0.8223613804987178))):
        with Locations((0, 47.5)):
            Circle(CROQUIS40_R)
    extrude(amount=-SALIENTE_EXTRUIR17_DEPTH)

    # Croquis41 → Cortar-Extruir30 (cut)
    with BuildSketch(Plane(origin=(0, -67.844813897, 98.06034482), x_dir=(1, 0, 0), z_dir=(0, -0.568965517289267, 0.8223613804987178))):
        with Locations(Location((0, 44.5, 0), (0, 0, 270))):
            Circle(CROQUIS41_R)
    extrude(amount=-CORTAR_EXTRUIR30_DEPTH, mode=Mode.SUBTRACT)

    # Croquis42 → Cortar-Extruir31 (cut, two sides: drawn at the far end of the back side and taken through both)
    with BuildSketch(Plane(origin=(0, 5.5, 0), x_dir=(1, 0, 0), z_dir=(0, 1, 0)).offset(-CORTAR_EXTRUIR31_DEPTH_BACK)):
        Rectangle(CROQUIS42_W, CROQUIS42_H)
    extrude(amount=CORTAR_EXTRUIR31_DEPTH + CORTAR_EXTRUIR31_DEPTH_BACK, mode=Mode.SUBTRACT)


solid = part_1.part
